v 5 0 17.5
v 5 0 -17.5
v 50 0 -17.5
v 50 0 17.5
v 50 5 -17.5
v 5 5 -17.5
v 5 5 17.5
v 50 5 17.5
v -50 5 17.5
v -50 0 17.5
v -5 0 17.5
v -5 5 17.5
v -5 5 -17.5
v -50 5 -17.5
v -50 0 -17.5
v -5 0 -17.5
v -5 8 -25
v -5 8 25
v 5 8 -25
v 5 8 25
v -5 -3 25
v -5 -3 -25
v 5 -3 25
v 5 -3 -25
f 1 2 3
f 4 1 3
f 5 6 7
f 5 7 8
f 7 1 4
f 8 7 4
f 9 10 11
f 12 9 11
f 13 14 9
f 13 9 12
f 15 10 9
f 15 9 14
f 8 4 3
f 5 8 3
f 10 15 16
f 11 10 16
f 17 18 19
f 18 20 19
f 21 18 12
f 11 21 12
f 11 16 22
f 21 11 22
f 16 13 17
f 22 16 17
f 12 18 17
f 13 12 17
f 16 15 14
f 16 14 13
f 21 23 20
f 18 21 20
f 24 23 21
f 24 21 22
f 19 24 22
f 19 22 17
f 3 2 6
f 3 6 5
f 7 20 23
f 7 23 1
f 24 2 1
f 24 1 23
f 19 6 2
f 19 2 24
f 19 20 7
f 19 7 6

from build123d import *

# Parameters (mm, degrees)
SKETCH_1_W      = 100
SKETCH_1_H      = 35
EXTRUDE_1_DEPTH = 5
SKETCH_3_W      = 50
SKETCH_3_H      = 11
EXTRUDE_2_DEPTH = 5


with BuildPart() as part:
    # 草图1 → 凸台-拉伸1 (new body)
    with BuildSketch(Plane(origin=(0, 0, 0), x_dir=(1, 0, 0), z_dir=(0, 1, 0))):
        Rectangle(SKETCH_1_W, SKETCH_1_H)
    extrude(amount=EXTRUDE_1_DEPTH)

    # 草图3 → 凸台-拉伸2 (add, symmetric)
    with BuildSketch(Plane(origin=(0, 0, 0), x_dir=(0, 0, -1), z_dir=(1, 0, 0))):
        with Locations((0, 2.5)):
            Rectangle(SKETCH_3_W, SKETCH_3_H)
    extrude(amount=EXTRUDE_2_DEPTH, both=True)


solid = part.part
